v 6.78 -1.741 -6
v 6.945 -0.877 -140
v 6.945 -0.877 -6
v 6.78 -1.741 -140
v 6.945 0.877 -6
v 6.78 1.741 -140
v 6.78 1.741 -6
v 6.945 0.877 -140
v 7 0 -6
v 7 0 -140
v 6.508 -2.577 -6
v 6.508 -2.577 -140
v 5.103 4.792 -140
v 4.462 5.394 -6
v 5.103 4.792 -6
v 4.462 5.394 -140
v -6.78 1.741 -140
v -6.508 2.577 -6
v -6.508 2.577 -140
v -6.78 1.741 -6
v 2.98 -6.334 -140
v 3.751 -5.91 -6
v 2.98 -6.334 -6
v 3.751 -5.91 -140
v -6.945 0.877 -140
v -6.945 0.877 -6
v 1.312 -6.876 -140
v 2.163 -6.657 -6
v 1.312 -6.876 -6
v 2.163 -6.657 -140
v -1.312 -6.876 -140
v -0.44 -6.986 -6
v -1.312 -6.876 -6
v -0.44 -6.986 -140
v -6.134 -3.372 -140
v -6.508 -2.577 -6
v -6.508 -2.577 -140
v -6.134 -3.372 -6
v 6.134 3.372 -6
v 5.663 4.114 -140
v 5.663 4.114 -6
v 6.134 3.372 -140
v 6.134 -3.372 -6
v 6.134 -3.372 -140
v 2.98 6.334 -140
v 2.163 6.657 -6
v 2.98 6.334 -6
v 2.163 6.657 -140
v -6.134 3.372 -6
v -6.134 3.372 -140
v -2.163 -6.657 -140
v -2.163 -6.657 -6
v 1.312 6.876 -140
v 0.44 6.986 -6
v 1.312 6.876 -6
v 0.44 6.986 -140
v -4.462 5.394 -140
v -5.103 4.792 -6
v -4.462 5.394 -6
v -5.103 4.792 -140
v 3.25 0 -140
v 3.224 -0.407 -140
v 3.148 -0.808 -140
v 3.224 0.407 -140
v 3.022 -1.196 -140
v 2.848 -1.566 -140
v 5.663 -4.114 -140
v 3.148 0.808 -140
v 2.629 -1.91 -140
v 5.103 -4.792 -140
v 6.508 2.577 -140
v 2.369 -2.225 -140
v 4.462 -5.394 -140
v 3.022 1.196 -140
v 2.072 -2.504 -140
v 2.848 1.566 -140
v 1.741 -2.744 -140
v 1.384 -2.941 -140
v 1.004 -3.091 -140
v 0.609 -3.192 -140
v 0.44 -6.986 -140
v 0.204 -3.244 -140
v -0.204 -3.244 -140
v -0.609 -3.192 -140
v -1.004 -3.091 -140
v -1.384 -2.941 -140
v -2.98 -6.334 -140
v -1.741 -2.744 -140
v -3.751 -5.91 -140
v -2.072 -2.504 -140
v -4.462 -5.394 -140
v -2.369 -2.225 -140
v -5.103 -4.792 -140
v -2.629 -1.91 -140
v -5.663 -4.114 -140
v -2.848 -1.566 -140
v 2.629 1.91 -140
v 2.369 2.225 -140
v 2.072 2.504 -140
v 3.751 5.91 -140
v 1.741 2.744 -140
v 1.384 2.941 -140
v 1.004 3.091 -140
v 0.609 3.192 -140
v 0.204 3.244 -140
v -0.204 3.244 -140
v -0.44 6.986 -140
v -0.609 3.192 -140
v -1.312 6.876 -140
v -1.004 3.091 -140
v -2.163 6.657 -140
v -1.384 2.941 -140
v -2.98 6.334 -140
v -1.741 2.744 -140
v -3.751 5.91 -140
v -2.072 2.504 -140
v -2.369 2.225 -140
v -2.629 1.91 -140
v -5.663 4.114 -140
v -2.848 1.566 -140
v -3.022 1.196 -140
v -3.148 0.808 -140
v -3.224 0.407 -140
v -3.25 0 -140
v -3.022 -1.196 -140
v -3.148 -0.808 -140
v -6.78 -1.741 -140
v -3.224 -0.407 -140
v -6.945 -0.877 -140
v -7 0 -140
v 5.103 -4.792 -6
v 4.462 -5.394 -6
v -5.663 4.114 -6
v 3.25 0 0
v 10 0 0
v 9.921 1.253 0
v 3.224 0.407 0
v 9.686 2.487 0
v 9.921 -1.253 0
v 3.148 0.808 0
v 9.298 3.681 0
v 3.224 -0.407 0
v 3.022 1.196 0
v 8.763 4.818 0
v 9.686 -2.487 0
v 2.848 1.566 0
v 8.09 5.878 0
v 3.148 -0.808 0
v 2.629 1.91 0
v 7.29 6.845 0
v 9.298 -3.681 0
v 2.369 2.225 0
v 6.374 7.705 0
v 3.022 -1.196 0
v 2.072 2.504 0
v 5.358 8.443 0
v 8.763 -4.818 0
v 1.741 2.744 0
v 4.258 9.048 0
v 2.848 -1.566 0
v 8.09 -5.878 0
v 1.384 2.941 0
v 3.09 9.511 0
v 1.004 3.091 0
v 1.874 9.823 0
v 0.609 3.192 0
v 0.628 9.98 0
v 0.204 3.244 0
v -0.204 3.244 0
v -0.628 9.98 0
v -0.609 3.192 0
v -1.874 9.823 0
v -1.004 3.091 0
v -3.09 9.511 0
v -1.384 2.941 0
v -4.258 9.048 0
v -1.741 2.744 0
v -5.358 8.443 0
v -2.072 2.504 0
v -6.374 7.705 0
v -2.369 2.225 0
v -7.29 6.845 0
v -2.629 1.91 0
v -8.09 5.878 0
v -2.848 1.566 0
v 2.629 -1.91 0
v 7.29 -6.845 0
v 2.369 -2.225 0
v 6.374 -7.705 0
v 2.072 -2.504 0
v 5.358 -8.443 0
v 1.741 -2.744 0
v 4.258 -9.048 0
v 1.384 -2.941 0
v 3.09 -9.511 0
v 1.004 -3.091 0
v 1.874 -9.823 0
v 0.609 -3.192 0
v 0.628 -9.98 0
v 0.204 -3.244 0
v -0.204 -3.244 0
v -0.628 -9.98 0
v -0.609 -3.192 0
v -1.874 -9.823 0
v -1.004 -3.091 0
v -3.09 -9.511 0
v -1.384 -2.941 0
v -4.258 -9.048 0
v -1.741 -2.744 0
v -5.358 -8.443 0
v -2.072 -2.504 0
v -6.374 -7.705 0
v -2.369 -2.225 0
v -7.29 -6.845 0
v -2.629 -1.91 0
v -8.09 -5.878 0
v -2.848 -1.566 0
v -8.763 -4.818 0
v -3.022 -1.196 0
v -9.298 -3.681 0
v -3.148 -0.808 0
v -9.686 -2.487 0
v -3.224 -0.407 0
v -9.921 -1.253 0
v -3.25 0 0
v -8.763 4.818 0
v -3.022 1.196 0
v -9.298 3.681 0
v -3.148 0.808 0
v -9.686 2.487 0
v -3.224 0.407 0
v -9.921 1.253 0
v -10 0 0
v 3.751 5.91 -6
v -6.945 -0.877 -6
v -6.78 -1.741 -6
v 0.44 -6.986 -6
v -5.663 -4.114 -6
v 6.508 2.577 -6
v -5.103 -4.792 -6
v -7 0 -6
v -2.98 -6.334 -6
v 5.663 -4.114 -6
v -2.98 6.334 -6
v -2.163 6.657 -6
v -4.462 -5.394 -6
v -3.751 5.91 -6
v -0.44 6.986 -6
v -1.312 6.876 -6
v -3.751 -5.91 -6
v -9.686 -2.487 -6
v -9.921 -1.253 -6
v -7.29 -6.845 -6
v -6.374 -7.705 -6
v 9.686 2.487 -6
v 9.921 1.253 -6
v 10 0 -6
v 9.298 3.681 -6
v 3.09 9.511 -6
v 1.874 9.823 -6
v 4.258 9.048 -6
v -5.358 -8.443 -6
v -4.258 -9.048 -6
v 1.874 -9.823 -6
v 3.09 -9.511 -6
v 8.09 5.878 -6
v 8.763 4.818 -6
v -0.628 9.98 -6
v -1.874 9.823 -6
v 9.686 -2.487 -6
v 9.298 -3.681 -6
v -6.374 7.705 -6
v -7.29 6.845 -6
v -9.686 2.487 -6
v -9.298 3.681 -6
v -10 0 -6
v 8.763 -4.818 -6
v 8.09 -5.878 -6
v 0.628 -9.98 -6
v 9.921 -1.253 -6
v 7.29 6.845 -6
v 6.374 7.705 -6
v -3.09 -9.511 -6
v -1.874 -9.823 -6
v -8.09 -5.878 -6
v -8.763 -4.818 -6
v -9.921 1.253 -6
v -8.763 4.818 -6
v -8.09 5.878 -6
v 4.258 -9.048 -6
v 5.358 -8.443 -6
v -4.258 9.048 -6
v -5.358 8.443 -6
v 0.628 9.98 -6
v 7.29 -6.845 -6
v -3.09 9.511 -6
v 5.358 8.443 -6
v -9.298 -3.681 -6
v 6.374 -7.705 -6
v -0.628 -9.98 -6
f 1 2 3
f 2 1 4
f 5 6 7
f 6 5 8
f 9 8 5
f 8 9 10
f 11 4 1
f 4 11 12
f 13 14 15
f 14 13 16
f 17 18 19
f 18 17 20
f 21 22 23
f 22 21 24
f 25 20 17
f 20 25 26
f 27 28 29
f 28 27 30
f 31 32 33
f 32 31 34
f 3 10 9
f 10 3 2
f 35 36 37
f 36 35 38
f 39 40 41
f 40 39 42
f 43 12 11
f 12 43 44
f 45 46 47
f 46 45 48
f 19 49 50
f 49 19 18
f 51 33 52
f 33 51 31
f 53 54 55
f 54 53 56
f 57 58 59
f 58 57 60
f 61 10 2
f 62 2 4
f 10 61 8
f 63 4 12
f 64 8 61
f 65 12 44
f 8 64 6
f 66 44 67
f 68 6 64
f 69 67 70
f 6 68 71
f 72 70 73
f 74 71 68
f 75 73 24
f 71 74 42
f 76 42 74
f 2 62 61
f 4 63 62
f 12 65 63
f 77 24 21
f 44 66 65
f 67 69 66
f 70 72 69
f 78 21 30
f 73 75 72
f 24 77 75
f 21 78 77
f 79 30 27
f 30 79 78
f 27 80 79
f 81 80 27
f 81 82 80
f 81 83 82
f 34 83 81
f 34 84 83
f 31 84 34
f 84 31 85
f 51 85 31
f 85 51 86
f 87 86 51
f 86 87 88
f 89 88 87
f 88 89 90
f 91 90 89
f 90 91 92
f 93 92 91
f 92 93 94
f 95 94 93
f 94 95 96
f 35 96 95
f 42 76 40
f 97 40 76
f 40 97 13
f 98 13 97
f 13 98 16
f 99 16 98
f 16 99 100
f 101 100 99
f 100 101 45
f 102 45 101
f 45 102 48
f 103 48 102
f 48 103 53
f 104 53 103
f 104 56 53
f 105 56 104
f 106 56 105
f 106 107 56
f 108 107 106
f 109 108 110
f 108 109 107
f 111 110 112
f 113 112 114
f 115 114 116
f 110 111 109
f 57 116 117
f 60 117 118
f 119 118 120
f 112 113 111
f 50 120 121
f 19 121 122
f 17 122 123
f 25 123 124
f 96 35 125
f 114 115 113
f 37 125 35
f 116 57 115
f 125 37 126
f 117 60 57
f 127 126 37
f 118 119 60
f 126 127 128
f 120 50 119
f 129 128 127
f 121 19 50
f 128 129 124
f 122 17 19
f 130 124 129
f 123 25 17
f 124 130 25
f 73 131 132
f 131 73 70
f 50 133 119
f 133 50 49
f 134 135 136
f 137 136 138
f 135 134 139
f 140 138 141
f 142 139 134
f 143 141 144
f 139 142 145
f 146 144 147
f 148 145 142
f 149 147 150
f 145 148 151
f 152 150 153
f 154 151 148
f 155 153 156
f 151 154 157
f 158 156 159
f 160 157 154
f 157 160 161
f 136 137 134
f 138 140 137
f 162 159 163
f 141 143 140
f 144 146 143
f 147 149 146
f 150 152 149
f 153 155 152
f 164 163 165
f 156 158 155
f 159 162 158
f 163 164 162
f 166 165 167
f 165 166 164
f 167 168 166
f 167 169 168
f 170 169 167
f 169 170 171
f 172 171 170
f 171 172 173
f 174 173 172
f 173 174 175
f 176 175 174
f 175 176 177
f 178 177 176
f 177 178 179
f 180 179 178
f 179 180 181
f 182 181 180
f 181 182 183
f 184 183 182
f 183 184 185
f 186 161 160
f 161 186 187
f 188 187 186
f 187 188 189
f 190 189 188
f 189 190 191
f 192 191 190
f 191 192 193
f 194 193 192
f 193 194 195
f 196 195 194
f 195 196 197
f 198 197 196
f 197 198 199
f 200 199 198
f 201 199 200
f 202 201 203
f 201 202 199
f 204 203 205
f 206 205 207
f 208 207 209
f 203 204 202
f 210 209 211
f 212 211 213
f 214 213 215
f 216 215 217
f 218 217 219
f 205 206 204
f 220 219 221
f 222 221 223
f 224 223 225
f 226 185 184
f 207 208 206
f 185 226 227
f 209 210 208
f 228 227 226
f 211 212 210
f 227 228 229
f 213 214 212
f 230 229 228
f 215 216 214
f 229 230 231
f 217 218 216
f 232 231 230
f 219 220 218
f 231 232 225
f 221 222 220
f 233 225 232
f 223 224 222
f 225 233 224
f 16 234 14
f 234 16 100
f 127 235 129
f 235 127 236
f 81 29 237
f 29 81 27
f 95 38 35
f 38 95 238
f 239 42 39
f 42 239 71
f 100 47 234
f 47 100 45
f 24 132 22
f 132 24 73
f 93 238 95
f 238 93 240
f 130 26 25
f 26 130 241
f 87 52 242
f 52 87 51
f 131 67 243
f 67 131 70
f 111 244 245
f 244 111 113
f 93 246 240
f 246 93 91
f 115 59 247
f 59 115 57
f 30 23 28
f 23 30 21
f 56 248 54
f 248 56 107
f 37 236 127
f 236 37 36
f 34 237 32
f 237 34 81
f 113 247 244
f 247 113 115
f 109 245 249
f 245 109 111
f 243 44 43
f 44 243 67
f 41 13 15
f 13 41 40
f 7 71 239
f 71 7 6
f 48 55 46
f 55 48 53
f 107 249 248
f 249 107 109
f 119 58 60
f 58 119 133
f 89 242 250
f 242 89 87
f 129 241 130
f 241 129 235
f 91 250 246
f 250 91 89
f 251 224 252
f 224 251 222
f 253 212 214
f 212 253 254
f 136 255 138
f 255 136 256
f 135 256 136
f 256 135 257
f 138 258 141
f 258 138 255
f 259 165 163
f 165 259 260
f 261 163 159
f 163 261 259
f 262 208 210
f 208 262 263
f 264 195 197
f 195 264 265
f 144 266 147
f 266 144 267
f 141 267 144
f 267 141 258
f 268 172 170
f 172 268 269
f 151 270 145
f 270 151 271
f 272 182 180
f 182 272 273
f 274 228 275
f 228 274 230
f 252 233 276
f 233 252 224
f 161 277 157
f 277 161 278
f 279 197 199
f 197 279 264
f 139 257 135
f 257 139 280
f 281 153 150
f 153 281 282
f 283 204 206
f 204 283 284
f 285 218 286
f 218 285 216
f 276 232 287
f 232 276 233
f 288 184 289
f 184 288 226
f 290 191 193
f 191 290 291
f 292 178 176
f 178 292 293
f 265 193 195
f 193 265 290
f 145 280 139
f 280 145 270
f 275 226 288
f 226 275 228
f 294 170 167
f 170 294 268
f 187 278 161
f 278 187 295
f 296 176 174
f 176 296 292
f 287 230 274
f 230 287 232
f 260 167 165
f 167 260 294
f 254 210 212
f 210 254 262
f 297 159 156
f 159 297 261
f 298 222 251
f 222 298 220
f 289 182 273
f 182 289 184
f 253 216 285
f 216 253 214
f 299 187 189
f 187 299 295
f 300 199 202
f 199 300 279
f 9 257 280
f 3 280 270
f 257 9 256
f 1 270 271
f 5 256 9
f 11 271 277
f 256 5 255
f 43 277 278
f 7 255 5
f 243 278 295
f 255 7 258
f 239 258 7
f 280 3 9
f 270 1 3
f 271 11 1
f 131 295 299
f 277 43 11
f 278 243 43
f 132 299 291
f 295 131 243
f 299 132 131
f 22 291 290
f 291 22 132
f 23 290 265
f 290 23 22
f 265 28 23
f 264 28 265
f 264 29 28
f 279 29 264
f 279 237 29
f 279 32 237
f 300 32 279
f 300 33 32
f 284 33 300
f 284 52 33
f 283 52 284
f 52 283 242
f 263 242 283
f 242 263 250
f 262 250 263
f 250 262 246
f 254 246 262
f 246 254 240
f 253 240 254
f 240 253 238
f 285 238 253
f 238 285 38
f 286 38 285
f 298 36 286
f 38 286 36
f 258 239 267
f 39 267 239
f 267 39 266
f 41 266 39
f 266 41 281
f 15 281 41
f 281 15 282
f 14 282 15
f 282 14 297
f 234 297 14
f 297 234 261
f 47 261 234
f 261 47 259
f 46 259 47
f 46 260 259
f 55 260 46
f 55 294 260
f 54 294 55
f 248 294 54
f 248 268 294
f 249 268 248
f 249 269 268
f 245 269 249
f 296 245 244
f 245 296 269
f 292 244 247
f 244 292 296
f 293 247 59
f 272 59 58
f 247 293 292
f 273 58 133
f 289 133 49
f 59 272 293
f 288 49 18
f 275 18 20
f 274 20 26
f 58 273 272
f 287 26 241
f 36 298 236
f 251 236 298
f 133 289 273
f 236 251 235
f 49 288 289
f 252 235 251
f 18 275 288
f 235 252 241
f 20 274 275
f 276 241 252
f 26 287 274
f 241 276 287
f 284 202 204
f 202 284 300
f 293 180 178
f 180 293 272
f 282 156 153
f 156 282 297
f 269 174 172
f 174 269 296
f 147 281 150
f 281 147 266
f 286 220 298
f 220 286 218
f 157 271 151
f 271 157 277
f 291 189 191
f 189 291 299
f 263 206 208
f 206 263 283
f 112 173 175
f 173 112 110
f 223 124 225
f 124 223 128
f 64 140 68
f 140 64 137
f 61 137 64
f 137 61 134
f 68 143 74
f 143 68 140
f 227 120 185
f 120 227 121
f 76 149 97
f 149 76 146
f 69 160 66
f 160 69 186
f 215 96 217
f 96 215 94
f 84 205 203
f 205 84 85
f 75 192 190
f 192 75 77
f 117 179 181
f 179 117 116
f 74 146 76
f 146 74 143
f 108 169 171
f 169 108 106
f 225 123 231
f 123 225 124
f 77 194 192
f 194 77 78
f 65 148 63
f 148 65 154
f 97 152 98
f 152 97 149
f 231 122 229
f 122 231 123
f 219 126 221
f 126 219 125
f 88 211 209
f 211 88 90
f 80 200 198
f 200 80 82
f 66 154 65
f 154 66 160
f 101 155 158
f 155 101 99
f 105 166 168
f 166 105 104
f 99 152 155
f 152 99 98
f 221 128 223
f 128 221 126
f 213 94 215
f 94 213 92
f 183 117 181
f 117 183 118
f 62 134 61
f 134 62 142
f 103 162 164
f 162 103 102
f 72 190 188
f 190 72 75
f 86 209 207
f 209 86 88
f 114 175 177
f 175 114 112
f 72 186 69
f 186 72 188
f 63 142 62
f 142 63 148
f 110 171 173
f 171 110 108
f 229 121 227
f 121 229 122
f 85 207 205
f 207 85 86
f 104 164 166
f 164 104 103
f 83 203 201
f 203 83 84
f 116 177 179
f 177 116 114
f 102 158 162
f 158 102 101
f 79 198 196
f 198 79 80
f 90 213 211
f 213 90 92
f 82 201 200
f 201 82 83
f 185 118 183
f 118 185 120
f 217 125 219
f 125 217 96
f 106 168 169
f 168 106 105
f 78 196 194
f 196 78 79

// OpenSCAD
$fn = 50;


difference() {
	union() {
		translate(v = [0, 0, -140.0000000000]) {
			cylinder(h = 140, r = 7.0000000000);
		}
		translate(v = [0, 0, -6.0000000000]) {
			cylinder(h = 6, r = 10.0000000000);
		}
	}
	union() {
		#translate(v = [0, 0, -140]) {
			cylinder(h = 140, r = 3.2500000000);
		}
	}
}
